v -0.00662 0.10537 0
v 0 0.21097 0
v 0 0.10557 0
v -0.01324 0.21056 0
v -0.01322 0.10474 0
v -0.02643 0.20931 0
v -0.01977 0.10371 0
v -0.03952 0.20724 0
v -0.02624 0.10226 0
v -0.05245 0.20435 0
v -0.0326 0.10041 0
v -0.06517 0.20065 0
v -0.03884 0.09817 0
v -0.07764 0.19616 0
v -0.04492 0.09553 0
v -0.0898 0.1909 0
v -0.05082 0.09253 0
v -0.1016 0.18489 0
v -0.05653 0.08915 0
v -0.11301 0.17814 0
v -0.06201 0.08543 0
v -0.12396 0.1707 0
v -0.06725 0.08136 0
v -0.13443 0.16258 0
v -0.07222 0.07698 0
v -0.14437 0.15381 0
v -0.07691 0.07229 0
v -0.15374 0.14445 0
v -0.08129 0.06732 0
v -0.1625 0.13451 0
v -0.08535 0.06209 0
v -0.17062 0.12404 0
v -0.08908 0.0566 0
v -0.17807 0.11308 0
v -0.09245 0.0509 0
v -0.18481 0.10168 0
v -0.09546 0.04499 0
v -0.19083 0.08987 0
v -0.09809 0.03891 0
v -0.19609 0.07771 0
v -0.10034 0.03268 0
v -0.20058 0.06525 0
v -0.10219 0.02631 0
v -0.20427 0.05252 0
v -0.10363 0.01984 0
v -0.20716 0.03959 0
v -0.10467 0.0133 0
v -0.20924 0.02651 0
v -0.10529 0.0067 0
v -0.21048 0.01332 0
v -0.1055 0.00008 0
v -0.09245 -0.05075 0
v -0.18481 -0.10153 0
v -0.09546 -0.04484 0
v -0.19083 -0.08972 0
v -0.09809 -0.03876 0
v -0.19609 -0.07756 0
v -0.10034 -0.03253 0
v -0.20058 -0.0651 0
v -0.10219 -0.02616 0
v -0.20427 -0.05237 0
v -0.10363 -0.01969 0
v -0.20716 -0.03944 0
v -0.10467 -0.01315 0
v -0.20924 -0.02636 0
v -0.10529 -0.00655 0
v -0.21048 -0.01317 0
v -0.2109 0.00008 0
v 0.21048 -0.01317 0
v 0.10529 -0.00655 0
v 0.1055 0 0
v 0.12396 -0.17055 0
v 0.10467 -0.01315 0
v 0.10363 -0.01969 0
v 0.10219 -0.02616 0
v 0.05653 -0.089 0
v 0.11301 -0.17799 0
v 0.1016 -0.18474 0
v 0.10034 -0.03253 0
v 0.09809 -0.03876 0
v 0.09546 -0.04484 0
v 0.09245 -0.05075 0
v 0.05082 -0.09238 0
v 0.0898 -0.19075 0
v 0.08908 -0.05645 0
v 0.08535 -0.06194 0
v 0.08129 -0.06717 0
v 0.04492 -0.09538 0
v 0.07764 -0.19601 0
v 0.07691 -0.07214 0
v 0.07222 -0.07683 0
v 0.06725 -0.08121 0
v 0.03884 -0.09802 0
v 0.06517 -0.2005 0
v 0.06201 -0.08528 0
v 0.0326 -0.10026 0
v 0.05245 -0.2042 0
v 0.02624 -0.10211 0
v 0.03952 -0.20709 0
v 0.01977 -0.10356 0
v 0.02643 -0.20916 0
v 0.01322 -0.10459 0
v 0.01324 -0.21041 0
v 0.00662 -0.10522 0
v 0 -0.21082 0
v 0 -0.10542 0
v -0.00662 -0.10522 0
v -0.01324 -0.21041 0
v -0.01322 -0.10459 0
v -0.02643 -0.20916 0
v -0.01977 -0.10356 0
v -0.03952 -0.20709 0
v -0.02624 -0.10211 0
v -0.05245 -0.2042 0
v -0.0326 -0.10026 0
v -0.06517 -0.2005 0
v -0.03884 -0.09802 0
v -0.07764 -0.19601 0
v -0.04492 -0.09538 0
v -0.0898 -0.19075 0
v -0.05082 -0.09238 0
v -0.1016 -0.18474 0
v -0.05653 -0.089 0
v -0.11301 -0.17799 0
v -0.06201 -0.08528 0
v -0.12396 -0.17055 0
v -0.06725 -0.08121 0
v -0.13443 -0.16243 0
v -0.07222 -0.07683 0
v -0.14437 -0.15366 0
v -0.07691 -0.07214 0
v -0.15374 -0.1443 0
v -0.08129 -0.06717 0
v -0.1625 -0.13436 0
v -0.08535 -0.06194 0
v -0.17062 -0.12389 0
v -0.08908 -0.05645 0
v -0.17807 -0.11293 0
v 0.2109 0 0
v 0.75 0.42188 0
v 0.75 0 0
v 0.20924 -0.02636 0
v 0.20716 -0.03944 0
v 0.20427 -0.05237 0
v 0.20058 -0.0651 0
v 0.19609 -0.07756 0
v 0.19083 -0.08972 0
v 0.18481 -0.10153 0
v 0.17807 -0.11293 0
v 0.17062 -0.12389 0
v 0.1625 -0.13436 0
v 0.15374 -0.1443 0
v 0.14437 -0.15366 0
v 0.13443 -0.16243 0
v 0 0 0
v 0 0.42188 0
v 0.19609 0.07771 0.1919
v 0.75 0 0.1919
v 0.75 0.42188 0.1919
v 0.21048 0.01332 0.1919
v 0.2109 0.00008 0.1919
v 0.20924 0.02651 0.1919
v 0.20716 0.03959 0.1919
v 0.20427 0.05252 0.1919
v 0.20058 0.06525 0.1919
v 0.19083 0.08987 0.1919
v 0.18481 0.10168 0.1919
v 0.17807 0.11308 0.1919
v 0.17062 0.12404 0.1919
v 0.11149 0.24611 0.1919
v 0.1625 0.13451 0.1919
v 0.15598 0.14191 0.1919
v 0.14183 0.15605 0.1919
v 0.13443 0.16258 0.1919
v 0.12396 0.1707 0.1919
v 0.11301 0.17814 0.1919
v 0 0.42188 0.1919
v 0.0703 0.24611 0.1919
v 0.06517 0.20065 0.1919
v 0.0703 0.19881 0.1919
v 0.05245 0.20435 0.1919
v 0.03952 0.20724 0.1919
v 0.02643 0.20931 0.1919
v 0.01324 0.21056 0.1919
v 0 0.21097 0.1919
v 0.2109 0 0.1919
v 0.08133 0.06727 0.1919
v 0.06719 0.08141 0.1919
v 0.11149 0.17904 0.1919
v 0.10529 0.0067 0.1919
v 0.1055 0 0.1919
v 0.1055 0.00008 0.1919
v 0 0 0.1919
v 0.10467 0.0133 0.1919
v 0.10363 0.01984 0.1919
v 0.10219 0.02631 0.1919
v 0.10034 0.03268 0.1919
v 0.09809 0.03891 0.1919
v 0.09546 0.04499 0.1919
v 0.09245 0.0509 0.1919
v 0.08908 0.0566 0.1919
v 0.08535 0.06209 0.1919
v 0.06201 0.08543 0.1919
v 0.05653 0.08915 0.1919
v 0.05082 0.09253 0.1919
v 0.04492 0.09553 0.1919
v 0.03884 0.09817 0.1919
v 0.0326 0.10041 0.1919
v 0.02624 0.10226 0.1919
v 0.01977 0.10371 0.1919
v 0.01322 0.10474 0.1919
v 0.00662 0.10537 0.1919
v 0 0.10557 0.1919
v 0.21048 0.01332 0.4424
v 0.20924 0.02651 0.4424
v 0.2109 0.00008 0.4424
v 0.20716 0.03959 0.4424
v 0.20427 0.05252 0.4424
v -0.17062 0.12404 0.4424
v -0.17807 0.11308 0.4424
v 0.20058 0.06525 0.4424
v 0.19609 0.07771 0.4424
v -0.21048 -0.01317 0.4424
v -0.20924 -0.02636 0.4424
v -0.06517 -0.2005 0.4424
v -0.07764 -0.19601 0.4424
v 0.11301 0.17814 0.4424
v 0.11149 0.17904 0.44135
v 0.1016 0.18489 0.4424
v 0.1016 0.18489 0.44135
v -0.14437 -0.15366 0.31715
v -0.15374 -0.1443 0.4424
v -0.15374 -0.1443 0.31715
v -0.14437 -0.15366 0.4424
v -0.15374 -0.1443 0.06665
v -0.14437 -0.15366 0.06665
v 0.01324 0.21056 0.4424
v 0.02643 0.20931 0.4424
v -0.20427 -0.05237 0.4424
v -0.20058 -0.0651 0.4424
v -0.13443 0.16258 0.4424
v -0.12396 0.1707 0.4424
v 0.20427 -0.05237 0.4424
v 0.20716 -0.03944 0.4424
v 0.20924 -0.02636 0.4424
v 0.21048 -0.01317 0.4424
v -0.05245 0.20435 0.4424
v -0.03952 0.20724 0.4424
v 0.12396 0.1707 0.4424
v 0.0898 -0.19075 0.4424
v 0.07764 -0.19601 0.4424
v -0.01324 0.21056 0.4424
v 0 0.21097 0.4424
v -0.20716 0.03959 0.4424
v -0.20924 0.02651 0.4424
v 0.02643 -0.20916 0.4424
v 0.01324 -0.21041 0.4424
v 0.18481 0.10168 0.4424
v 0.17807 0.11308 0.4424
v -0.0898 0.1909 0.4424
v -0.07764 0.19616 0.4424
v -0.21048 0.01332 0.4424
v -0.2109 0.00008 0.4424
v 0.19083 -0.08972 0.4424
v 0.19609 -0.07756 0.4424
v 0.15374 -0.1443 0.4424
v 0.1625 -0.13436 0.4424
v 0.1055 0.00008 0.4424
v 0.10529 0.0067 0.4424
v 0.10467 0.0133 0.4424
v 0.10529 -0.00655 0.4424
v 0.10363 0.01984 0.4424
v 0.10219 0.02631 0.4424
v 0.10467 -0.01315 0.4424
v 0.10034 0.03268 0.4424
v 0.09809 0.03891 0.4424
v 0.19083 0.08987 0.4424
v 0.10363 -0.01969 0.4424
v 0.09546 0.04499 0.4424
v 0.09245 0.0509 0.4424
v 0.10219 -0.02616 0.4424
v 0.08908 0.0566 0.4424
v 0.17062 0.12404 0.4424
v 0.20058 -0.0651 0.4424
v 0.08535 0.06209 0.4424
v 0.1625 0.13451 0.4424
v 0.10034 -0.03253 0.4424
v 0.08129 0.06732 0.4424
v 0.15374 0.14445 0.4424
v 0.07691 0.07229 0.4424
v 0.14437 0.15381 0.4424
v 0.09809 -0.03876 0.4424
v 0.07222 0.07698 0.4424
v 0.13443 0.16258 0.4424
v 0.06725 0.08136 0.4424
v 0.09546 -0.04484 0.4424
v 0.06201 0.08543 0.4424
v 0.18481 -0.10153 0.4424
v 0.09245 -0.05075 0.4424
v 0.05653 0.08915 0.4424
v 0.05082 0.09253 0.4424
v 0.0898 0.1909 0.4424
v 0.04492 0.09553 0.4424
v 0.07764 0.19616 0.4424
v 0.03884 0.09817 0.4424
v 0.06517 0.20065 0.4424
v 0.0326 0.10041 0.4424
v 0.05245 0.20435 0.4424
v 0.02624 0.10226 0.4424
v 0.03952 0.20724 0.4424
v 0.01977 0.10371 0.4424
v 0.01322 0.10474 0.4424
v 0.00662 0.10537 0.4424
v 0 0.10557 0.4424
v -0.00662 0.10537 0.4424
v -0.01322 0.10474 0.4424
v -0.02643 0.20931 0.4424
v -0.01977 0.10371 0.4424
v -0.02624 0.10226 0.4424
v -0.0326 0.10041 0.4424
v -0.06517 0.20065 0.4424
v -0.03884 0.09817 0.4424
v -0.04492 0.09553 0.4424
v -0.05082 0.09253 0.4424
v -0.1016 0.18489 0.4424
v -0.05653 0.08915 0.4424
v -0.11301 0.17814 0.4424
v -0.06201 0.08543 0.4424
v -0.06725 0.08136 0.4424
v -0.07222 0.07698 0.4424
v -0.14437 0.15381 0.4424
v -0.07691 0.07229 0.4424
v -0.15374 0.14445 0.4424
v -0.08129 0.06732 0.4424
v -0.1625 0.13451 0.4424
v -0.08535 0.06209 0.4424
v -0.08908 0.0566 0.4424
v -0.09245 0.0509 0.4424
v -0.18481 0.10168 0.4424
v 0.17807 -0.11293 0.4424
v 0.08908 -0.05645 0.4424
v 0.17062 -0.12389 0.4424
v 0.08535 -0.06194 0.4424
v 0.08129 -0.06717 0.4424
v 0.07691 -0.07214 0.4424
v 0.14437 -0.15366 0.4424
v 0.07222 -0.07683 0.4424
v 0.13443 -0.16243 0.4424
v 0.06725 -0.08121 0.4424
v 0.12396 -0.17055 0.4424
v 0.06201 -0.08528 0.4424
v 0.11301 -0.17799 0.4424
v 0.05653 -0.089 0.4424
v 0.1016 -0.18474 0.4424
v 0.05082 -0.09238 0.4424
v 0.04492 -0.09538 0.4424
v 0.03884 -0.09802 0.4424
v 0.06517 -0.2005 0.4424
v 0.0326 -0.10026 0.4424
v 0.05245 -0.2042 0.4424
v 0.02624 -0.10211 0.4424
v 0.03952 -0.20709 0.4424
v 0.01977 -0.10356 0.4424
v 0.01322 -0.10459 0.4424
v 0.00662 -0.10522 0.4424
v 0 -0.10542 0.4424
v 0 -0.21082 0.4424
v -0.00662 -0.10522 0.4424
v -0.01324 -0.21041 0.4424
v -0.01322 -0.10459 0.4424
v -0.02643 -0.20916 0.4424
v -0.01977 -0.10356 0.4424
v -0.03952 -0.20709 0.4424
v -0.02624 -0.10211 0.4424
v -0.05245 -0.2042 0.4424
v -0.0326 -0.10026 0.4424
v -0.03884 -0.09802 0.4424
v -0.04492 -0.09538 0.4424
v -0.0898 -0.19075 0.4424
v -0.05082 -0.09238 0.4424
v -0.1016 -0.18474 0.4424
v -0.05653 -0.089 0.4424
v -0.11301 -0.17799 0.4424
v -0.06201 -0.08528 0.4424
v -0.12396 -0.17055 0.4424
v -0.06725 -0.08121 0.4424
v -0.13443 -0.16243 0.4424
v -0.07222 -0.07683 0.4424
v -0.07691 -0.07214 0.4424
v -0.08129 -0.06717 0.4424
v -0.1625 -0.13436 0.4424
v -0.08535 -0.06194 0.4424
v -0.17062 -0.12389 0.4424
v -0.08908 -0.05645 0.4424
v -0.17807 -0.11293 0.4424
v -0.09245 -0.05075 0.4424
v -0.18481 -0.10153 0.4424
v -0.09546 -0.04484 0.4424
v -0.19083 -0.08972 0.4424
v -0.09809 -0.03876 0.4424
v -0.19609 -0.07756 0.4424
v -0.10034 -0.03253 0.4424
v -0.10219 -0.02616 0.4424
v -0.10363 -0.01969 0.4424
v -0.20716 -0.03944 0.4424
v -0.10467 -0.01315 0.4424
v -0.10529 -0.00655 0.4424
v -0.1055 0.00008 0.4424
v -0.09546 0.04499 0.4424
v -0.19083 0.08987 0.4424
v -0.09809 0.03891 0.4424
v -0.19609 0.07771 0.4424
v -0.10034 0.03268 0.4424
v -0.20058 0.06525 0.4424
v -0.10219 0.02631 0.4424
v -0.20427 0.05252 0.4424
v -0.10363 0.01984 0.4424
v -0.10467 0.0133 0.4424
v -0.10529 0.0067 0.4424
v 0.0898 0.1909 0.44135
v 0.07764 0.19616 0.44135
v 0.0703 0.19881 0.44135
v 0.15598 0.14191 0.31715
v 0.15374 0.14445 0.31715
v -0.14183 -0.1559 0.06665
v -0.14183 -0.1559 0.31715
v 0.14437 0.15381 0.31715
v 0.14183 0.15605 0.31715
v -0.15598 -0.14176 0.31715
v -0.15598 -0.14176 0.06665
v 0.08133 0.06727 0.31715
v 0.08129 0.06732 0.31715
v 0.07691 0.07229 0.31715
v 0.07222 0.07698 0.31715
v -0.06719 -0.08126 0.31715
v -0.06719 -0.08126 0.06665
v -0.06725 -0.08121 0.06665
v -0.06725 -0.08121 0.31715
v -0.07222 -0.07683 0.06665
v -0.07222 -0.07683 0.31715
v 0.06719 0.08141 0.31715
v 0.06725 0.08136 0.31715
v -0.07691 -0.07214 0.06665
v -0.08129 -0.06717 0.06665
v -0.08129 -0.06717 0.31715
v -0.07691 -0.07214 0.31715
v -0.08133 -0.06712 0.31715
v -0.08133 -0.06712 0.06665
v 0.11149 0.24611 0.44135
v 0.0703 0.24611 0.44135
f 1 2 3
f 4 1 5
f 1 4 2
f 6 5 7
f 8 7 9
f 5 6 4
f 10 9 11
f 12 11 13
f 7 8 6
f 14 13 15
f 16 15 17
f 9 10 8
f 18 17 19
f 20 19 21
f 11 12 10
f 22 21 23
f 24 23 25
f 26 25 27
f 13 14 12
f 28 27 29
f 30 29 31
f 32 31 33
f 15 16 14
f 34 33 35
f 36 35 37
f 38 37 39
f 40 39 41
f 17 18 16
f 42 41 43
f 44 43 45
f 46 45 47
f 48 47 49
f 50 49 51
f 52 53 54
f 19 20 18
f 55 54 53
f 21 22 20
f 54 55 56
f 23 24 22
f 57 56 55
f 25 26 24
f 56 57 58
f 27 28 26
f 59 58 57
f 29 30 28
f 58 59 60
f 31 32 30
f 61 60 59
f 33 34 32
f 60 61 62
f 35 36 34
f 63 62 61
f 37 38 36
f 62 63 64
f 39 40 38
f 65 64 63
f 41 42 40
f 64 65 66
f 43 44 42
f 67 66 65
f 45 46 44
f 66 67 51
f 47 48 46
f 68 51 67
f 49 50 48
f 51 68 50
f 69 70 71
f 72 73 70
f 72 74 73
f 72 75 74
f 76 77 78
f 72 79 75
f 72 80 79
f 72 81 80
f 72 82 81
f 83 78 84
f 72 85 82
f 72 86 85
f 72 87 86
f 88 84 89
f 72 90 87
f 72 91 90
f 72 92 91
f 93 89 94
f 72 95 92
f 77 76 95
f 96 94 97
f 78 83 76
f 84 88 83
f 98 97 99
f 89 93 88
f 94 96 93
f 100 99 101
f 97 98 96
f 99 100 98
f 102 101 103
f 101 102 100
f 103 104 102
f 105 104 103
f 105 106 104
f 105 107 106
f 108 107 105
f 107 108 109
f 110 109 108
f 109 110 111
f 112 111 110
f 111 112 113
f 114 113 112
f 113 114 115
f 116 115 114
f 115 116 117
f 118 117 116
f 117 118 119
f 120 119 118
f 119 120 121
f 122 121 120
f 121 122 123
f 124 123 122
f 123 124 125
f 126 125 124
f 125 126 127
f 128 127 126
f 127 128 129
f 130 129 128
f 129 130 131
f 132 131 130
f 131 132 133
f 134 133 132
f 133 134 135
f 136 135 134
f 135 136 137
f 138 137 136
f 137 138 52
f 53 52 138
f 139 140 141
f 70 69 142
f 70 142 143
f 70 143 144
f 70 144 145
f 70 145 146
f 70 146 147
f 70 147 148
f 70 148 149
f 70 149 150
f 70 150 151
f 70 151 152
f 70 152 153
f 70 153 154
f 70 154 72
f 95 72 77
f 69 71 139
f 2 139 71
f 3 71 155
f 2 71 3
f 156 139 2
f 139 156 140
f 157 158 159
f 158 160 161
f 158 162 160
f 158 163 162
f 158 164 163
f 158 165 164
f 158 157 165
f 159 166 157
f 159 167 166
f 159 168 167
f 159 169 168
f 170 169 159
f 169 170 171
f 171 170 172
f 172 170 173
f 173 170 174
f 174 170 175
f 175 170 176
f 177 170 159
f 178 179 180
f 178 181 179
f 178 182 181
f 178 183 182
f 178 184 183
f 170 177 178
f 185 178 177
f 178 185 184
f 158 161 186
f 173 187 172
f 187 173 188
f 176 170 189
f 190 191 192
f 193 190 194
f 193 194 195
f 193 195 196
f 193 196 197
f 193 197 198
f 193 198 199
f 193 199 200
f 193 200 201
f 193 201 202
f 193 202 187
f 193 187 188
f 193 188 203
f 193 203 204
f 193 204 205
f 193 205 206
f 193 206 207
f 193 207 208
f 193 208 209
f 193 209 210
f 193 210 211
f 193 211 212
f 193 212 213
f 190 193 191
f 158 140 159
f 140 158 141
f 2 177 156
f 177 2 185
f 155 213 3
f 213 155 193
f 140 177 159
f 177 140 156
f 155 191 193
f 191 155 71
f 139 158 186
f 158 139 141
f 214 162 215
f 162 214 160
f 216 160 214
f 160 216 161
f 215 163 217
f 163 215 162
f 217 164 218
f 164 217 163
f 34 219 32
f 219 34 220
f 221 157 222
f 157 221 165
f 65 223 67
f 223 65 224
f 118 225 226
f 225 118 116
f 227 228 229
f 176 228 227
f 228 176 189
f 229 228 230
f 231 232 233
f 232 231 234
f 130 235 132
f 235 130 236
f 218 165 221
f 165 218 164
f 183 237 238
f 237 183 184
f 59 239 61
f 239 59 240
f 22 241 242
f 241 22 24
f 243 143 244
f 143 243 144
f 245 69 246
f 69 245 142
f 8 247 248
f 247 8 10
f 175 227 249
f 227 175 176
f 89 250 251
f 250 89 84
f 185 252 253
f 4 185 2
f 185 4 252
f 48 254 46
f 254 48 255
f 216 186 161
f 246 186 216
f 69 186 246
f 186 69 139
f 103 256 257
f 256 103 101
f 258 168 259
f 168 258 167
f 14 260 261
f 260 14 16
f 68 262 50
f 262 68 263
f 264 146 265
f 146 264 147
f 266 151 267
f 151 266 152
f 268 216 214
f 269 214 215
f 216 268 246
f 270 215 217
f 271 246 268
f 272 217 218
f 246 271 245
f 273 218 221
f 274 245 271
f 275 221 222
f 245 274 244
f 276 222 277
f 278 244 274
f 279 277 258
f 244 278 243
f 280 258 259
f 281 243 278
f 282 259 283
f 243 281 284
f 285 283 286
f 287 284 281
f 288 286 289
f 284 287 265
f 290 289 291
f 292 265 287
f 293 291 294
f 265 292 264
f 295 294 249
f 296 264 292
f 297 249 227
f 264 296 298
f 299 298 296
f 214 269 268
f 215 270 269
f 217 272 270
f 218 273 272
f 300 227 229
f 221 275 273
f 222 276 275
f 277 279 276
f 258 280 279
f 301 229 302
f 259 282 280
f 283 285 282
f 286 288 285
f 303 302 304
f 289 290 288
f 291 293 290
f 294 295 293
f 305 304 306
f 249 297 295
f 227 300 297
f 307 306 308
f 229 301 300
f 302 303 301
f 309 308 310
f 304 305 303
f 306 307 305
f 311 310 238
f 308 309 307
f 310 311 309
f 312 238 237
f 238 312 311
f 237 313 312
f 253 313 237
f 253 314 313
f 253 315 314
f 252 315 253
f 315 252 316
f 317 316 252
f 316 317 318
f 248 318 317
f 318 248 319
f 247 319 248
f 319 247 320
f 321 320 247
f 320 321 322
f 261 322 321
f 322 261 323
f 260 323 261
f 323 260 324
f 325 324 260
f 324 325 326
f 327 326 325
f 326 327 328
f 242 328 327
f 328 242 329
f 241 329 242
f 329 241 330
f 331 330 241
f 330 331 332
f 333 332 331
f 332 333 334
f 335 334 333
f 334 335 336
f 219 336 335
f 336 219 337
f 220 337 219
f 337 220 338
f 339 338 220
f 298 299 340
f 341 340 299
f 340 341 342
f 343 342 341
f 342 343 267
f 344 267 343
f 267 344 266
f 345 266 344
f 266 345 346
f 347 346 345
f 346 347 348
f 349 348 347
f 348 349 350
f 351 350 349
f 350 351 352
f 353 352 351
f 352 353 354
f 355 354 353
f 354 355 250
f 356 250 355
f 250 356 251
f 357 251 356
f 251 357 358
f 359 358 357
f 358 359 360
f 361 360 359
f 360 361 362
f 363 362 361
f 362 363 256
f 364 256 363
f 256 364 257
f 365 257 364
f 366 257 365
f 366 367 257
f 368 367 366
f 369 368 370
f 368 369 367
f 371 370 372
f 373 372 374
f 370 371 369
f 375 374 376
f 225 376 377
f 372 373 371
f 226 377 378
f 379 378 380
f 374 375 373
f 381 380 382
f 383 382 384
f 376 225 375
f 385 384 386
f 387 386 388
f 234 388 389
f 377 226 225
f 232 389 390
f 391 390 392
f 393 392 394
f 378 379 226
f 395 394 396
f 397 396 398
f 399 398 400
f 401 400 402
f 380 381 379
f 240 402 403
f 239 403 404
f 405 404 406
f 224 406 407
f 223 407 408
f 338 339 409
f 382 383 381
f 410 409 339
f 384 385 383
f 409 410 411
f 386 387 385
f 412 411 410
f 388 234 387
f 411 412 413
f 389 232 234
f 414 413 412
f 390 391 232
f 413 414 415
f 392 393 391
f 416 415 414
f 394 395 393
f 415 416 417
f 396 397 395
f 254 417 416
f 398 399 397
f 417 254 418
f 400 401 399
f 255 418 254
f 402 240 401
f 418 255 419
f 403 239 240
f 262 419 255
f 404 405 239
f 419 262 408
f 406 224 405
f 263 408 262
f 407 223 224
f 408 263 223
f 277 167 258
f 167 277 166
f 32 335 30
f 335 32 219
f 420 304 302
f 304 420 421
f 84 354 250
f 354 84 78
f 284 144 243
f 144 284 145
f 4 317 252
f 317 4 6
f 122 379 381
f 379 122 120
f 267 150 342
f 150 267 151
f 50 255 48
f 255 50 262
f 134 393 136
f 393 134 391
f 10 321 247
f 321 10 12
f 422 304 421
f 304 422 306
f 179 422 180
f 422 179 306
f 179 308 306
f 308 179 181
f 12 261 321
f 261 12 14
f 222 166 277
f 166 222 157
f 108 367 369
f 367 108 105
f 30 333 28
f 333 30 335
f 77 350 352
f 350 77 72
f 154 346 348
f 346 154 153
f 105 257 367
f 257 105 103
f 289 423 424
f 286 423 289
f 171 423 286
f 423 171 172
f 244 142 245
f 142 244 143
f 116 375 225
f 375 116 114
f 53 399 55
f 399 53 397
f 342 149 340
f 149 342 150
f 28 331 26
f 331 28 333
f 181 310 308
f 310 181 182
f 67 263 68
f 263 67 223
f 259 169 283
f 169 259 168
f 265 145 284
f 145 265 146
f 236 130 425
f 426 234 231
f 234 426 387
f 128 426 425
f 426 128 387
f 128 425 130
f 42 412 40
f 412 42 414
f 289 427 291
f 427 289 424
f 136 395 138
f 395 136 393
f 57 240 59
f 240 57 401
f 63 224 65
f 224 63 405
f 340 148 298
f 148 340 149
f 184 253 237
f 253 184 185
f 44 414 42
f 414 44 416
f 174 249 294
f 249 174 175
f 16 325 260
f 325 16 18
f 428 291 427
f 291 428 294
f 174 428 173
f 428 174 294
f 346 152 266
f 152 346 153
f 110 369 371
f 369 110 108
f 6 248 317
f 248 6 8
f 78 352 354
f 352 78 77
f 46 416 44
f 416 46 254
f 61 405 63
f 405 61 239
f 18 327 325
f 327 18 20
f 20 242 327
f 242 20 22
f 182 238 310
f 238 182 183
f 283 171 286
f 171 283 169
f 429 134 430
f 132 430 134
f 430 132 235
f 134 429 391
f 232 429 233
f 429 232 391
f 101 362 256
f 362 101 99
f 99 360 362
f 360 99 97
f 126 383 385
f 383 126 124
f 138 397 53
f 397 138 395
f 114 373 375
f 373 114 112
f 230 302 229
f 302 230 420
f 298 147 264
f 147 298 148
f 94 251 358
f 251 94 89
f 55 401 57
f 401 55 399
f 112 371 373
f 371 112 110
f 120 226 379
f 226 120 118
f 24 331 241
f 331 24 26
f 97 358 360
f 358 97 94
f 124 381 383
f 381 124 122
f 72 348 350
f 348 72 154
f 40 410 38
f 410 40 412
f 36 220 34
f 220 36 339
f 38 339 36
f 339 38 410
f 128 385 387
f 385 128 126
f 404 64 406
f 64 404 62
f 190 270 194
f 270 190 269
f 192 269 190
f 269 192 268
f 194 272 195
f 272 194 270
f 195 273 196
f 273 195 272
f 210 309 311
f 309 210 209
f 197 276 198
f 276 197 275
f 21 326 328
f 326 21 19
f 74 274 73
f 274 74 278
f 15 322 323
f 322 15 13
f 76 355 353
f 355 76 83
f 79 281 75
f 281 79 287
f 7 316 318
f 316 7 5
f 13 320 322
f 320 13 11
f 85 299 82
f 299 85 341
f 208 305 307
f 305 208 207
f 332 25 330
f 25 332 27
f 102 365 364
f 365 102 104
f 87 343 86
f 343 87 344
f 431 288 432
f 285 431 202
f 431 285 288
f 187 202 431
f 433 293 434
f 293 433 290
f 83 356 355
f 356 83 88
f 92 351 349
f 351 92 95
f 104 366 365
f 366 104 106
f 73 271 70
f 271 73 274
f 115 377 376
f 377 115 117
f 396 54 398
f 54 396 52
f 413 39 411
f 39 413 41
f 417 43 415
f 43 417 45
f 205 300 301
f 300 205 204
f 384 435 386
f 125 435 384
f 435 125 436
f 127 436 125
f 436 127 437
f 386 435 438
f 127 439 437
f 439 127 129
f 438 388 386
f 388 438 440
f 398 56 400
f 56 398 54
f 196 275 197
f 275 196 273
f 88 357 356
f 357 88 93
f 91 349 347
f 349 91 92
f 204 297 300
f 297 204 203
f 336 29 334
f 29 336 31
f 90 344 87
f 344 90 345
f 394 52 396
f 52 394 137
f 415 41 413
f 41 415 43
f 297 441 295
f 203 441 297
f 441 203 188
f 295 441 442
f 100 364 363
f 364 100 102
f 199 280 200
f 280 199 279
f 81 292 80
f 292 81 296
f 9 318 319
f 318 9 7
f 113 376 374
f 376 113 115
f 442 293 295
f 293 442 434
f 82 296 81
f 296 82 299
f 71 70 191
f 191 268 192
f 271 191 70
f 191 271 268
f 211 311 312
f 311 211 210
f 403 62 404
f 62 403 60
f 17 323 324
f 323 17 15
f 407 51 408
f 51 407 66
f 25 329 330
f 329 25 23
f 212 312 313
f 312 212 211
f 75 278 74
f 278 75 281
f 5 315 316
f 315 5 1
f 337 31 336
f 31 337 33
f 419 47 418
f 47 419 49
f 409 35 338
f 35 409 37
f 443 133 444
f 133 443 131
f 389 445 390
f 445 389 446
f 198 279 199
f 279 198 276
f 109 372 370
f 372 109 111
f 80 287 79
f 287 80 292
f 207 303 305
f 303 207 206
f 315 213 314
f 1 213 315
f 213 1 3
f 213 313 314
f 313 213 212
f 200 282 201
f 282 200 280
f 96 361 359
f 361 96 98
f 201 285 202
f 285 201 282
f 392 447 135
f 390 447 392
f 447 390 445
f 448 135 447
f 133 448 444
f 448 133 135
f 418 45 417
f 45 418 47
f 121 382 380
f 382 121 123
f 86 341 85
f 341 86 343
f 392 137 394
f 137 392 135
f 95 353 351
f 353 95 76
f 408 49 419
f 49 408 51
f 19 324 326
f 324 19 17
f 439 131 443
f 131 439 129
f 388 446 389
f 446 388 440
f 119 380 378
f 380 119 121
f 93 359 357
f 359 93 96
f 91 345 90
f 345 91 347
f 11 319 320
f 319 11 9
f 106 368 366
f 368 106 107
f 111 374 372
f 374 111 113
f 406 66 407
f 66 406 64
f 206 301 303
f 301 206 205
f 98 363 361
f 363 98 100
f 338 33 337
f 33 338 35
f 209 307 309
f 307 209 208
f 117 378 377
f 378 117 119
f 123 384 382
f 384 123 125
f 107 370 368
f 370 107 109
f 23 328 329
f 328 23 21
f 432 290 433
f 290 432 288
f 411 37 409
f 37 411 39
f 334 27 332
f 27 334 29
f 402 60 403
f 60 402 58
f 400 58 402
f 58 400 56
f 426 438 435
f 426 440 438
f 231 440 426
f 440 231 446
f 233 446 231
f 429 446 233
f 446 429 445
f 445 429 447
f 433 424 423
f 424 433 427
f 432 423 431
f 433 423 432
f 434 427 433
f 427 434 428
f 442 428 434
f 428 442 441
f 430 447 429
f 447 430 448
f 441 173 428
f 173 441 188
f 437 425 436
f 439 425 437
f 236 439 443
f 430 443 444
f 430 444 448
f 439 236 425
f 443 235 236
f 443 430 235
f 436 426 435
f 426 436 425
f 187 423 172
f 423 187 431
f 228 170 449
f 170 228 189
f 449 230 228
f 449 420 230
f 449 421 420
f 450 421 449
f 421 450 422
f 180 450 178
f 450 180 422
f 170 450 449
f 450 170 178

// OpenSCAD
// Main reference span dimensions
base_length = 0.75;
base_width = 0.421875;
base_height = 0.191921;

// Lower base extrusion height
lower_base_height = 0.1919;

// Left circular profile parameters
left_circle_x = 0.2109;
left_circle_y = 0.2109;
left_circle_radius = 0.2109;

// Right circular group parameters
right_circle_x = 0.6094;
right_circle_y = 0.2109;
right_outer_radius = 0.1406;
right_inner_radius = 0.1055;

// Upper circular section parameters
upper_section_height = 0.4424;
upper_section_width = 0.4218;
upper_section_depth = 0.4218;
upper_left_offset = 0;
upper_right_offset = 0.3282;
upper_front_offset = 0;
upper_back_offset = 0;

// Rectangular tab parameters
tab_length = 0.041188;
tab_width = 0.070313;
tab_height = 0.441346;
tab_left_offset = 0.0703;
tab_right_offset = 0.6385;
tab_front_offset = 0.1758;
tab_back_offset = 0.1757;

// Resolution control
$fn = 100;

// Module for lower base with circular profiles and voids
module lower_base() {
    difference() {
        // Main base plate (will be modified with voids)
        cube([base_length, base_width, lower_base_height]);
        
        // Left circular profile void (creates solid cylinder)
        // Actually this is a solid feature, so we don't subtract it
        // Instead, we'll add it as a solid cylinder
    }
    
    // Add left solid cylinder
    translate([left_circle_x, left_circle_y, 0])
        cylinder(h = lower_base_height, r = left_circle_radius);
    
    // Add right annular cylinder (outer - inner)
    translate([right_circle_x, right_circle_y, 0])
        difference() {
            cylinder(h = lower_base_height, r = right_outer_radius);
            cylinder(h = lower_base_height, r = right_inner_radius);
        }
    
    // Create slot-like voids in the base
    // These are rounded cutouts that create voids in the base
    // Example slot: a rectangular slot with rounded ends
    translate([0.3, 0.1, 0]) {
        // Slot shape: rectangle with rounded ends
        hull() {
            translate([0, 0, 0])
                cylinder(h = lower_base_height, r = 0.02);
            translate([0.2, 0, 0])
                cylinder(h = lower_base_height, r = 0.02);
        }
    }
    
    // Additional curved void
    translate([0.5, 0.3, 0]) {
        difference() {
            cylinder(h = lower_base_height, r = 0.05);
            cylinder(h = lower_base_height, r = 0.03);
        }
    }
}

// Module for upper circular section (taller continuation)
module upper_section() {
    // Calculate position based on offsets
    x_pos = base_length - upper_right_offset - upper_section_width;
    y_pos = base_width - upper_back_offset - upper_section_depth;
    
    translate([x_pos, y_pos, 0]) {
        difference() {
            // Outer cylinder
            cylinder(h = upper_section_height, r = upper_section_width/2);
            
            // Inner annular void
            cylinder(h = upper_section_height, r = right_inner_radius);
            
            // Rounded slot interruptions in the opening
            // Create a slot through the cylinder wall
            translate([0, 0, lower_base_height]) {
                rotate([0, 0, 45])
                    cube([upper_section_width, 0.02, upper_section_height - lower_base_height], center = true);
            }
        }
    }
}

// Module for rectangular upright tab
module rectangular_tab() {
    // Calculate position based on offsets
    x_pos = tab_left_offset;
    y_pos = tab_front_offset;
    
    translate([x_pos, y_pos, 0])
        cube([tab_length, tab_width, tab_height]);
}

// Main assembly
union() {
    // Lower base with circular profiles and voids
    lower_base();
    
    // Upper circular section (taller continuation)
    upper_section();
    
    // Rectangular upright tab
    rectangular_tab();
}
